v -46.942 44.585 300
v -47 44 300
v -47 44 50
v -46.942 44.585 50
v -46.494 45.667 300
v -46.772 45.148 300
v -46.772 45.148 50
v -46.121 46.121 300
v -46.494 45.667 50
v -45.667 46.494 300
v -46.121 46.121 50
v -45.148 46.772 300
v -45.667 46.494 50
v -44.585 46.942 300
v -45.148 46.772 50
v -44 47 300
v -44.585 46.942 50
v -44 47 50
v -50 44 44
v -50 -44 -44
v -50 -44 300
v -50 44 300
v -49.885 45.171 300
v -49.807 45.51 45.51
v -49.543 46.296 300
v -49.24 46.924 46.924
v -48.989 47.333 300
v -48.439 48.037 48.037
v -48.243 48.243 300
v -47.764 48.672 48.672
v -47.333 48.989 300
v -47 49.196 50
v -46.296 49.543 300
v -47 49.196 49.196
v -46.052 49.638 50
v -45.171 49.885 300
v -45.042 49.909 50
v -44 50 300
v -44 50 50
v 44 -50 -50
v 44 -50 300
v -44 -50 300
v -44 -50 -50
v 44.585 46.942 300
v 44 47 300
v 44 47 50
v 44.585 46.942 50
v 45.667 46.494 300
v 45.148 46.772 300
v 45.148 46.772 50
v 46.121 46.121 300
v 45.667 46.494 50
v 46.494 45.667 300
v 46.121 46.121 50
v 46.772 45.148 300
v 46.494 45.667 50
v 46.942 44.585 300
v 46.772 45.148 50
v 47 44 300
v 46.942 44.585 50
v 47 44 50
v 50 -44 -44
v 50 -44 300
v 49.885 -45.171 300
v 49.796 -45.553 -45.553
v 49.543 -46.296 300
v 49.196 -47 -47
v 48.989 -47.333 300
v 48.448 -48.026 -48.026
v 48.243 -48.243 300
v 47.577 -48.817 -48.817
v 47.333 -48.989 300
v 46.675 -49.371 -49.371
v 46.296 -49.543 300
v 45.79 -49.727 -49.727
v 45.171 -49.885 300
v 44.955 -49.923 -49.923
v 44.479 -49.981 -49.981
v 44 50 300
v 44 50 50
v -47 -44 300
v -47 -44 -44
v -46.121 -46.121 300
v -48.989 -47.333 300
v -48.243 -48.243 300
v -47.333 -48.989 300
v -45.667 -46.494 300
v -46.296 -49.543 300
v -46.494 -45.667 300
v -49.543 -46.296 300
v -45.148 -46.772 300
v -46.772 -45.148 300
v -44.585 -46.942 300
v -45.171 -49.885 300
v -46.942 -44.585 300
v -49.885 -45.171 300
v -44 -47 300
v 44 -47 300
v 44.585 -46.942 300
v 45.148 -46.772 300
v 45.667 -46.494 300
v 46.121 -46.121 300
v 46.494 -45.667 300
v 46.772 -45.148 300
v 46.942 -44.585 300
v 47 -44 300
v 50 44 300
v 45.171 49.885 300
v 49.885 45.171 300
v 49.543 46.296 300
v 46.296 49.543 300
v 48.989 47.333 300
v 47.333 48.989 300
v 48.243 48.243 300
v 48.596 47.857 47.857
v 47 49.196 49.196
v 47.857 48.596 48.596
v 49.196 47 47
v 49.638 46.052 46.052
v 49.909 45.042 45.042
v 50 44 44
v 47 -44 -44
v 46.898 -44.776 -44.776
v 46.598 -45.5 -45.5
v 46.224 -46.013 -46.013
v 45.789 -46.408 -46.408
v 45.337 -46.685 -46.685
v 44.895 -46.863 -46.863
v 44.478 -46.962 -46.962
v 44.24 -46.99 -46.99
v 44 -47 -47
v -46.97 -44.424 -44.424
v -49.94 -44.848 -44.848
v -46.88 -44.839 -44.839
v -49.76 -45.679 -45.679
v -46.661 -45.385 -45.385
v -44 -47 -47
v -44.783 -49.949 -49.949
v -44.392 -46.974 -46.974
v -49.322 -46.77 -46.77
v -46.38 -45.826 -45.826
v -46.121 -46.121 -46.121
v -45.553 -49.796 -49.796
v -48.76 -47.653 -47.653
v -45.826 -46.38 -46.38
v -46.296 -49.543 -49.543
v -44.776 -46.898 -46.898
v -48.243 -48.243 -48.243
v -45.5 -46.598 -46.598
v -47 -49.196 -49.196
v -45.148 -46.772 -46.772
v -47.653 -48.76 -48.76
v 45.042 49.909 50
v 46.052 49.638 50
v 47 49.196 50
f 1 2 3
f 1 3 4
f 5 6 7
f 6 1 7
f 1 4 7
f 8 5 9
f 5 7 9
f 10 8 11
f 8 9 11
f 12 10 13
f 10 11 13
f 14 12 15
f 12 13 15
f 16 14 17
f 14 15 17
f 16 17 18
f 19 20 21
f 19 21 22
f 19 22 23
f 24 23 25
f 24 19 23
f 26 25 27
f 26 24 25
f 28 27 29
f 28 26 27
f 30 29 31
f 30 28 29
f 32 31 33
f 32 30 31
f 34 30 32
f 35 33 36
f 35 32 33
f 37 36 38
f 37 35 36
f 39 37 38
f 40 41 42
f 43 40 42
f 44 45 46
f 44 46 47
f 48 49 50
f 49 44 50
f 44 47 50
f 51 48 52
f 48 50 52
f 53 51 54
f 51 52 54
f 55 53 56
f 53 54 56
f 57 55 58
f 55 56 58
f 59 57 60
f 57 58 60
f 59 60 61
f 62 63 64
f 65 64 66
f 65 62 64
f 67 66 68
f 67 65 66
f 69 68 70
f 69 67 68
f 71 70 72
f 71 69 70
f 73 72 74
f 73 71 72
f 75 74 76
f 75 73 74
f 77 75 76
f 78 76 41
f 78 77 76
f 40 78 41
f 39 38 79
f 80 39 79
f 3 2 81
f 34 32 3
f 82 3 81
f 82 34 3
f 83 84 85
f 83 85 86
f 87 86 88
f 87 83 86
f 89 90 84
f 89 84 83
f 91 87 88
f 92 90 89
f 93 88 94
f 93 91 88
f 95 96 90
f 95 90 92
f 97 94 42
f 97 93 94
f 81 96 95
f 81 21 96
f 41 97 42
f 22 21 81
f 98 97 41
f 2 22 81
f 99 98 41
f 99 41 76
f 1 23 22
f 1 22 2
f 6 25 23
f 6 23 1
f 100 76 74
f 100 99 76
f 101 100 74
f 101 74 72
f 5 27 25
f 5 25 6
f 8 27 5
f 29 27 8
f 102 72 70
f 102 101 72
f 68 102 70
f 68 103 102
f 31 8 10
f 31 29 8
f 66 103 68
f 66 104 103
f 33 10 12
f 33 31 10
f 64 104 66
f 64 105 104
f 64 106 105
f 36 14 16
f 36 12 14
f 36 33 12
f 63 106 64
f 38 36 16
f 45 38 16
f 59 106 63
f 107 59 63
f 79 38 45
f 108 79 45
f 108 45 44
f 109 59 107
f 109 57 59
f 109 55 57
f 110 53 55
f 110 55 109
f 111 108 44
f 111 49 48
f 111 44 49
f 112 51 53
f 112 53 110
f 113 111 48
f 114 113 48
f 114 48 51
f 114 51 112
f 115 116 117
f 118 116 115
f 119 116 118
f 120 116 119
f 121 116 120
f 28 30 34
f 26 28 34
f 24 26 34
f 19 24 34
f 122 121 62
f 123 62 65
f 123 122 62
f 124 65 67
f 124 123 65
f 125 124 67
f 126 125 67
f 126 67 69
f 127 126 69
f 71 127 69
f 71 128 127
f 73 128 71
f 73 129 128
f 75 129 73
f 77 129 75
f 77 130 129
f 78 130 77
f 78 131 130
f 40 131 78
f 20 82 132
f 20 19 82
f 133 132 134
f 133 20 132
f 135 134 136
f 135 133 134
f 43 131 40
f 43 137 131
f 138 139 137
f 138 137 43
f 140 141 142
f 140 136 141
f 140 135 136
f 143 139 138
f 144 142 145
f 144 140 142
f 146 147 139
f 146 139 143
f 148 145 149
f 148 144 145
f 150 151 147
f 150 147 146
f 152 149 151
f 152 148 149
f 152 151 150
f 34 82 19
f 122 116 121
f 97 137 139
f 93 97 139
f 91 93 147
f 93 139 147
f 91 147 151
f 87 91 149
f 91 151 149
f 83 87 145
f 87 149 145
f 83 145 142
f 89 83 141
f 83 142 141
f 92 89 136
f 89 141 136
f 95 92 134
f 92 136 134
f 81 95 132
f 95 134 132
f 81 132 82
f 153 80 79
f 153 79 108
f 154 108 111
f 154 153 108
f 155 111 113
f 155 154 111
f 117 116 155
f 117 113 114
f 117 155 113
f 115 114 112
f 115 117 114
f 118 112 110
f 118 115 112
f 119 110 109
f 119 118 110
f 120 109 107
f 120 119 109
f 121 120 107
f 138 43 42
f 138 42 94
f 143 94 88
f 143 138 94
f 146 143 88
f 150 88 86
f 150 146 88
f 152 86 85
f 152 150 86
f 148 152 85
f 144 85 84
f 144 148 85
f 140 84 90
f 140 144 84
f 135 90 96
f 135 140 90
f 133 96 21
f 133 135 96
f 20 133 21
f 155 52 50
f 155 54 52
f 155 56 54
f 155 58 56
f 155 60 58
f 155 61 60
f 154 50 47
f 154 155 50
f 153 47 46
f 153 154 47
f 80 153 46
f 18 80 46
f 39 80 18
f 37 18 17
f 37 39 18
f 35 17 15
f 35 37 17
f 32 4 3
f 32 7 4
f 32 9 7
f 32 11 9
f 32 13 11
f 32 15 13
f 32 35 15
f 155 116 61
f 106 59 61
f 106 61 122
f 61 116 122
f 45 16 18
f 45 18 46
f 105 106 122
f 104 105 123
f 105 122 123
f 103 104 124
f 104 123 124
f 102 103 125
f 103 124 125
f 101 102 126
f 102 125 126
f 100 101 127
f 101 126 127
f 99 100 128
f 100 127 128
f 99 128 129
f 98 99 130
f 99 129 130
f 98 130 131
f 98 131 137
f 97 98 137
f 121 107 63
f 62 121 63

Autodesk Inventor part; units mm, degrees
ref_plane "Start Plane" through (0, 0, -50) normal (0, 0, 1) x (1, 0, 0)
ref_plane "End Plane" through (0, 0, 300) normal (0, 0, 1) x (1, 0, 0)
sketch "Sketch" plane through (0, 0, 0) normal (0, 0, 1) x (1, 0, 0)
  line L0 (-50, -44) -> (-50, 44)
  line L1 (-44, 50) -> (44, 50)
  line L2 (50, 44) -> (50, -44)
  line L3 (44, -50) -> (-44, -50)
  arc A0 (-50, -44) -> (-44, -50) centre (-44, -44) ccw
  arc A1 (50, 44) -> (44, 50) centre (44, 44) ccw
  arc A2 (-44, 50) -> (-50, 44) centre (-44, 44) ccw
  arc A3 (44, -50) -> (50, -44) centre (44, -44) ccw
  arc A4 (-44, 47) -> (-47, 44) centre (-44, 44) ccw
  line L4 (-44, 47) -> (44, 47)
  arc A5 (47, 44) -> (44, 47) centre (44, 44) ccw
  line L5 (47, 44) -> (47, -44)
  arc A6 (44, -47) -> (47, -44) centre (44, -44) ccw
  line L6 (44, -47) -> (-44, -47)
  arc A7 (-47, -44) -> (-44, -47) centre (-44, -44) ccw
  line L7 (-47, -44) -> (-47, 44)
  line L8 (0, 71.7397) -> (0, -71.7397) construction
  line L9 (-71.7397, 0) -> (71.7397, 0) construction
  dimension "d7" = 6
  dimension "d9" = 100
  dimension "d11" = 100
  dimension "d12" = 3
  dimension "d15" = 50
  dimension "d16" = 50
extrude "Body" add sketch "Sketch" along normal up to surface (350 mm away) from surface at -50
sketch "Sketch3" plane through (0, 0, 0) normal (0, 0, 1) x (1, 0, 0)
  line L0 (0, 0) -> (10, 0)
ref_plane "Work Plane3" through (0, 0, 0) normal (0, -1, 0) x (1, 0, 0)
sketch "Sketch5" plane through (44, 50, 300) normal (0, 1, 0) x (1, 0, 0)
  line L0 (3, 0) -> (3, 350) projected
  line L1 (-91, 350) -> (3, 350)
  line L2 (3, 350) -> (3, 250)
  line L3 (3, 250) -> (-91, 250)
  line L4 (-91, 250) -> (-91, 350)
  point P0 (-44, 300)
  point P1 (3, 300)
  point P2 (3, 300)
  dimension "d19" = 100
extrude "Extrusion2" cut sketch "Sketch5" against normal blind 10
ref_plane "Work Plane5" through (0, -50, -50) normal (0, 0.7071, -0.7071) x (1, 0, 0)
split "Split2" plane through (0, -50, -50) removes the side toward (0, 0.7071, -0.7071)
sketch "Sketch4" plane through (0, 0, 0) normal (0, -1, 0) x (1, 0, 0)
  line L0 (-2, -50) -> (12, -50) projected
  line L1 (-2, 300) -> (12, 300) projected
  dimension "d18" = 350
equation "\"d7\" = G_IR"
equation "\"d9\" = G_W"
equation "\"d11\" = G_H"
equation "\"d12\" = G_T"
equation "\"d15\" = 0.5 * d9"
equation "\"d16\" = 0.5 * d11"
equation "\"d3\" = G_L"
equation "\"G_W\" = 100"
equation "\"G_H\" = 100"
equation "\"G_T\" = 3"
equation "\"G_IR\" = 6"
equation "\"G_L\" = d18"
equation "\"G_OFFSET_END\" = 0"
properties part number "ISO 10799-2 - 100x100x3 - 350" material "Steel, Mild"
